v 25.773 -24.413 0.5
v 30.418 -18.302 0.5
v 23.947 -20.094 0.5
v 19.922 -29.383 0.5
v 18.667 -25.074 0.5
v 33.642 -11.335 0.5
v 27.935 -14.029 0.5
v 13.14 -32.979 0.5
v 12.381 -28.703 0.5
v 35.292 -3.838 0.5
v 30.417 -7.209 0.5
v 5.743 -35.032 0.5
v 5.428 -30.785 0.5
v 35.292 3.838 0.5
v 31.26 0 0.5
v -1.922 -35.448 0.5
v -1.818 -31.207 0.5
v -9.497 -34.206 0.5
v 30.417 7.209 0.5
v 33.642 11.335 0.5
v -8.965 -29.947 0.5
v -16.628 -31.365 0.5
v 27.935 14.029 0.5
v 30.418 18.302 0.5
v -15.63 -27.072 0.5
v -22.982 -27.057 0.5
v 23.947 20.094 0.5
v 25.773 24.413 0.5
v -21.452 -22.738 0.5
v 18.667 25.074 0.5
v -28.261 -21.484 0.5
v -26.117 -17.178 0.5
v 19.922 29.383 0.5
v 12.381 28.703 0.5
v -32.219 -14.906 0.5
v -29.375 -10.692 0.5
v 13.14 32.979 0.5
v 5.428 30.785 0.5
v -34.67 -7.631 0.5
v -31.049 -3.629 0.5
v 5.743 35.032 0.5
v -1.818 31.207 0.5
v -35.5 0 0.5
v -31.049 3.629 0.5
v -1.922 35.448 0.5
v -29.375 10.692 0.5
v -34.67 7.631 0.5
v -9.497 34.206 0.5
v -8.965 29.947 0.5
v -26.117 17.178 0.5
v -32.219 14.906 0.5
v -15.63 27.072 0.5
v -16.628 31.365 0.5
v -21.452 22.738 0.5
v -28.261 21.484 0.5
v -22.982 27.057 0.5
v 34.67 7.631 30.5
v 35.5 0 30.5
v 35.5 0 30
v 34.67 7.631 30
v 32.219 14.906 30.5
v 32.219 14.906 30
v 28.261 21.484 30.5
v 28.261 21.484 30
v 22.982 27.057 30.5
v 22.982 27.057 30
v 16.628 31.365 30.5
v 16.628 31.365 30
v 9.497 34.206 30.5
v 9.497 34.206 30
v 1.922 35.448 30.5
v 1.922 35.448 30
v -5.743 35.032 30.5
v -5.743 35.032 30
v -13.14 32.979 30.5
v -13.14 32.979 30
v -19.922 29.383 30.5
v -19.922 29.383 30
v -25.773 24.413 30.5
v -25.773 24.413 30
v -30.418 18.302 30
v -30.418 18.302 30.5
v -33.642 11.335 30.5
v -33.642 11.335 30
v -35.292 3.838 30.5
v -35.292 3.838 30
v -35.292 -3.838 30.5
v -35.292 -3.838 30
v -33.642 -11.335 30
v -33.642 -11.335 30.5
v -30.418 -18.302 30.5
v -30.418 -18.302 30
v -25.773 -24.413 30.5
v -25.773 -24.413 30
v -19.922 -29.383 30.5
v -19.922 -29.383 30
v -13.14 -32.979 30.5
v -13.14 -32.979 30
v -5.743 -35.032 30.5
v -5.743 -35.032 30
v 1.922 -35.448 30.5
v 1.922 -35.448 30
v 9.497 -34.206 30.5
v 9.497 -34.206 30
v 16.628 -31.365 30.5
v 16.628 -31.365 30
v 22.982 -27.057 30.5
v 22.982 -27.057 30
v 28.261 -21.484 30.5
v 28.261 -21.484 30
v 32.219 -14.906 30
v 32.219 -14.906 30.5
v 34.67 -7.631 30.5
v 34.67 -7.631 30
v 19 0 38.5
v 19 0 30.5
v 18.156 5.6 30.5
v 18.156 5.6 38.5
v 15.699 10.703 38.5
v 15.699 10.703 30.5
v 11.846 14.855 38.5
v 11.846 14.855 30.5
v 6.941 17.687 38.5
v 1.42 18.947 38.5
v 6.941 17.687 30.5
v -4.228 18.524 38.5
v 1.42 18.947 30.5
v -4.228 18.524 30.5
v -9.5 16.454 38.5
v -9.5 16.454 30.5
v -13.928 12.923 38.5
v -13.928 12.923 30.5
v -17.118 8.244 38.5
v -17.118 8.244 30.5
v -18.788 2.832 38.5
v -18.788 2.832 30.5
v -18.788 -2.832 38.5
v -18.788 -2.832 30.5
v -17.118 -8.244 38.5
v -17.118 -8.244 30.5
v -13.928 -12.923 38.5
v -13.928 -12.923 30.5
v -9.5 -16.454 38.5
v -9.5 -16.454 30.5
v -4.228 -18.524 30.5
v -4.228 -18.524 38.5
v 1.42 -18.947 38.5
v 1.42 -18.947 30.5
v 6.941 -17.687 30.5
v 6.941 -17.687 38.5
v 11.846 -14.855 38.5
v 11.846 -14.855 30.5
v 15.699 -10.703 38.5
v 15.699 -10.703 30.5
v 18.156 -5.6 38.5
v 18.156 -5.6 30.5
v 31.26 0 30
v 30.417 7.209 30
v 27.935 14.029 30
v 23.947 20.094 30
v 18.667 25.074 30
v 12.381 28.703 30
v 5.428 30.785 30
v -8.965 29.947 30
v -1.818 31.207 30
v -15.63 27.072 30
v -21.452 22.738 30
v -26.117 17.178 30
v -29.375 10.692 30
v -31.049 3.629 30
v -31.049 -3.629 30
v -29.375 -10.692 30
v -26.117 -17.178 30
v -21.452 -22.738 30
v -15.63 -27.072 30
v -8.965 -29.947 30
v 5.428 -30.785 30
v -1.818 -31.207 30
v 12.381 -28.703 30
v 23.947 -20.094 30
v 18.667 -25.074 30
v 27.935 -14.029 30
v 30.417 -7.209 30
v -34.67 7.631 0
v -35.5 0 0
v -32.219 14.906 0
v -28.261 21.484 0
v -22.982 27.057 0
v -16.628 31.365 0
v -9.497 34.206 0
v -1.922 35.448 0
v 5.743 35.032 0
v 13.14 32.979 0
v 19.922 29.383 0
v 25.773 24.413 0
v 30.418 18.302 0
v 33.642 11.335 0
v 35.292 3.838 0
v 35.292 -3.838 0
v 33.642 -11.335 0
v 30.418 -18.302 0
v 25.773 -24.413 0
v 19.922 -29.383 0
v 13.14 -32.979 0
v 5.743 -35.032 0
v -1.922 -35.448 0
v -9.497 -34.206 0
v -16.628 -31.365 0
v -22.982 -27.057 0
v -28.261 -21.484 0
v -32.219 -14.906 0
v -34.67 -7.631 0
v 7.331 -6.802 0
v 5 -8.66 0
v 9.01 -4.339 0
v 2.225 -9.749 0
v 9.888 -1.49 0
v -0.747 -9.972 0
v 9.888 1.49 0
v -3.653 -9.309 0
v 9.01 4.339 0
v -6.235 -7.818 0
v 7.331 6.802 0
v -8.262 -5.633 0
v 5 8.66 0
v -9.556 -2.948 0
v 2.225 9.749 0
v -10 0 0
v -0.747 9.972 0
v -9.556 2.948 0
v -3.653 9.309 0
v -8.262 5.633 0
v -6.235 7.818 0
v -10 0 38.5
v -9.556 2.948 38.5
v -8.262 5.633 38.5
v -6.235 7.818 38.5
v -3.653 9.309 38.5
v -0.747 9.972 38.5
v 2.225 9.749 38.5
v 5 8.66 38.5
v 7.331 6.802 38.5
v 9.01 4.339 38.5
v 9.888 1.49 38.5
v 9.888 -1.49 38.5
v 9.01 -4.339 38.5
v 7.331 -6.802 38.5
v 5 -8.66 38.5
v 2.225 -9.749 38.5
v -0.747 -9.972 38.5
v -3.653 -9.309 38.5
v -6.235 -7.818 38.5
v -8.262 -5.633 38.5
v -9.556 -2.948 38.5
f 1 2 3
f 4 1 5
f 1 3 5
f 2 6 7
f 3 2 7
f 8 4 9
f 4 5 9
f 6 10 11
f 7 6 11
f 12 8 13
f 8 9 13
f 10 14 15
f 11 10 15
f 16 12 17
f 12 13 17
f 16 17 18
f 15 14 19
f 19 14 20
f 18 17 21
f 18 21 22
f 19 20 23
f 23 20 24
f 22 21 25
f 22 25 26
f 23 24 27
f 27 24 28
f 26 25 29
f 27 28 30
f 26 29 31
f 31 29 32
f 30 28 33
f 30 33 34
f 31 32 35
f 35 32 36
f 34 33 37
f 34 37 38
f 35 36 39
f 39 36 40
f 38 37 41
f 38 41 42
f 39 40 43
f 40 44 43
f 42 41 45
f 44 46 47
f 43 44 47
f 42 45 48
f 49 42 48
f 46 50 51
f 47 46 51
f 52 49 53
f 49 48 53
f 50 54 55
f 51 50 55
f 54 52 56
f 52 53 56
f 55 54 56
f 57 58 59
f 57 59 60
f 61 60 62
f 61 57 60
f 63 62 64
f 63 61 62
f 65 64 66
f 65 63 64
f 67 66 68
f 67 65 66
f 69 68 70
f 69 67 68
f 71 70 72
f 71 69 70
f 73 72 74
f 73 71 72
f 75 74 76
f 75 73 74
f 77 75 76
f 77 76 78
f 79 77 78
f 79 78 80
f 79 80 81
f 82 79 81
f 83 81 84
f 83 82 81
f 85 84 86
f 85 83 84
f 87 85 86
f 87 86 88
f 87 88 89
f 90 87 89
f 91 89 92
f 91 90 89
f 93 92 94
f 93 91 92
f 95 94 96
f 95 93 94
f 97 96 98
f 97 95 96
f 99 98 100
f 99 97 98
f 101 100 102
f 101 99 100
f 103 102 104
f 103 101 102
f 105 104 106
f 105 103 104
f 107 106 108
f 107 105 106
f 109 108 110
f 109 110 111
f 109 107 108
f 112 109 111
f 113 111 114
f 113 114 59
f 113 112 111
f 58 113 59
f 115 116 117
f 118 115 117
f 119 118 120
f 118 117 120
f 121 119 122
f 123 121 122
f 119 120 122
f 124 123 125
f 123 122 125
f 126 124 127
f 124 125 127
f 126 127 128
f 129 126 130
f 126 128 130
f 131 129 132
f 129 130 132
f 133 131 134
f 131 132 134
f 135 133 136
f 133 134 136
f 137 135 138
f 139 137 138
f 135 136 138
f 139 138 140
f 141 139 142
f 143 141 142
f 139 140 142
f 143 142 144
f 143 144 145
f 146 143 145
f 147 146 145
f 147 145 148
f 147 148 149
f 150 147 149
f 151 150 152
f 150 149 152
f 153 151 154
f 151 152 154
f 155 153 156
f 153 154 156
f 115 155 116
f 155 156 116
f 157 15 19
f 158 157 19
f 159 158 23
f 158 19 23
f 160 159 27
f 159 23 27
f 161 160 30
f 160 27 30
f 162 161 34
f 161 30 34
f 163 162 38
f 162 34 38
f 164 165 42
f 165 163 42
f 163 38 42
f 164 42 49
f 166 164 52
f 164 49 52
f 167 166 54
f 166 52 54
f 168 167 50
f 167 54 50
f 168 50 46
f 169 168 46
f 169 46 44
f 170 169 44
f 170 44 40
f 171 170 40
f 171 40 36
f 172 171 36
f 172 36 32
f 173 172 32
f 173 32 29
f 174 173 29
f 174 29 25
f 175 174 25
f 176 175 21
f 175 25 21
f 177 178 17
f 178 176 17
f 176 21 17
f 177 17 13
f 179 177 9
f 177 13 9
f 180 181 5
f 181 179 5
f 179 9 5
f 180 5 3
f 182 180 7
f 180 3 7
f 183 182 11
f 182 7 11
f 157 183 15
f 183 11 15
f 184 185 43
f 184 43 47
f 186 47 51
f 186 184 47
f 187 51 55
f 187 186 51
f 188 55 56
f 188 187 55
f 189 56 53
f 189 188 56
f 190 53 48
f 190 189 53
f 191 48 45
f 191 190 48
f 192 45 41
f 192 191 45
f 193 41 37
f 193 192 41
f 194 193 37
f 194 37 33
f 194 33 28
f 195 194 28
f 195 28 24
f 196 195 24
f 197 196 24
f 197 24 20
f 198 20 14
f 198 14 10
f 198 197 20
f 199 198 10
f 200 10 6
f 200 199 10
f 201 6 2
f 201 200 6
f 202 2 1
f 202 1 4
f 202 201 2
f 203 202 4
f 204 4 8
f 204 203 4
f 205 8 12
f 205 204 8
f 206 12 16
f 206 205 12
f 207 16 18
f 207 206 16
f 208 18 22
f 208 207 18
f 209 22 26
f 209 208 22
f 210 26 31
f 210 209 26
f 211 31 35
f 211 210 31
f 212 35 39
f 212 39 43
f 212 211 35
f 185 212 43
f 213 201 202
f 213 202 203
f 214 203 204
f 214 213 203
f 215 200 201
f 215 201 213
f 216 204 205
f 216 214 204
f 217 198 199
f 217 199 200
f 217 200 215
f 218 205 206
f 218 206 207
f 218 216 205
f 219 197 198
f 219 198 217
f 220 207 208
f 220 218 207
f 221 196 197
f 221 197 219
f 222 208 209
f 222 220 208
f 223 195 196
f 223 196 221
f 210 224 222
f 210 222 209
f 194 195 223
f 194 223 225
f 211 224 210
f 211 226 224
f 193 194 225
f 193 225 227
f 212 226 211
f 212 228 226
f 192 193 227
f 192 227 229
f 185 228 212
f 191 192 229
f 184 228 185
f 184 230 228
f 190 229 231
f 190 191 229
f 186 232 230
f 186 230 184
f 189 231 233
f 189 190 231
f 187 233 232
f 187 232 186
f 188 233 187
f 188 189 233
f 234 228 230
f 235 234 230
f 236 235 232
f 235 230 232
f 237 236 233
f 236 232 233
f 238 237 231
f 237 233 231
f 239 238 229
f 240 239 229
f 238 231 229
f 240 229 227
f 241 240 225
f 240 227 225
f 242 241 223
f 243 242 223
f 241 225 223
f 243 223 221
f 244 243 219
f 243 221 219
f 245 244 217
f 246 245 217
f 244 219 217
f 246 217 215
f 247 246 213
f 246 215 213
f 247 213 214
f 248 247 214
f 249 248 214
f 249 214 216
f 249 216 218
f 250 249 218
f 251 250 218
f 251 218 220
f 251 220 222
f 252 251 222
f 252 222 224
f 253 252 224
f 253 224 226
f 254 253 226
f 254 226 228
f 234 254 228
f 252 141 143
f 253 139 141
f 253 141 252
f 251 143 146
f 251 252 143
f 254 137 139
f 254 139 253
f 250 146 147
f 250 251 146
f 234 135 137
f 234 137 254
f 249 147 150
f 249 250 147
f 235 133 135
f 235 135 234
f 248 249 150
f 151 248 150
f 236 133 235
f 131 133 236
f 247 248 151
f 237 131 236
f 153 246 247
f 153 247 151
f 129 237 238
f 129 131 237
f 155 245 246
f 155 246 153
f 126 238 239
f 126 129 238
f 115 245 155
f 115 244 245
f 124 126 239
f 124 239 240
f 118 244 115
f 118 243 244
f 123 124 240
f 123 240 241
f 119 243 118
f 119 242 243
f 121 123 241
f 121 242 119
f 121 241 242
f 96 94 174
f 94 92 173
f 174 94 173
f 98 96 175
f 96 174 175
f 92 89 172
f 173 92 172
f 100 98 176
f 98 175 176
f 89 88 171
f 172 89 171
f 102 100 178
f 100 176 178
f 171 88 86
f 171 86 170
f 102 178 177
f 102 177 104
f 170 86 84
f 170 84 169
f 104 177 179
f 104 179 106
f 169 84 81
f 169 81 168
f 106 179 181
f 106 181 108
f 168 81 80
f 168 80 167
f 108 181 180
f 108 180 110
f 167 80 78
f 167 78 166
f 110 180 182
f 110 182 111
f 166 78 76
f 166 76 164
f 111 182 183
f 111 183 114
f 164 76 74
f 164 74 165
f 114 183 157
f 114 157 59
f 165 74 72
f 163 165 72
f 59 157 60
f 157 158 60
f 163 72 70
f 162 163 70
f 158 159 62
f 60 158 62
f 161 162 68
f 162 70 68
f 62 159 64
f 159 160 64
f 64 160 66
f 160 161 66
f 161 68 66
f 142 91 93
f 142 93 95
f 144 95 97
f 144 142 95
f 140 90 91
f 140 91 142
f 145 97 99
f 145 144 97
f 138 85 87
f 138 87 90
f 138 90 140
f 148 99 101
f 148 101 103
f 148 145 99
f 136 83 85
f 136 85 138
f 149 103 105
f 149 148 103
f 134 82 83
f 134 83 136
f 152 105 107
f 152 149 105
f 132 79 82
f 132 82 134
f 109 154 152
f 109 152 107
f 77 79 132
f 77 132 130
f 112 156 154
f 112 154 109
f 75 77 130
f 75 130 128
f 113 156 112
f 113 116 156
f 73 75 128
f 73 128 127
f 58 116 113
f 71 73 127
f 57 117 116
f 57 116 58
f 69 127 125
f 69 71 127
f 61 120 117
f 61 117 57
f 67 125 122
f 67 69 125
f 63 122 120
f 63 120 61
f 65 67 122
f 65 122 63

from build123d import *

# Parameters (mm, degrees)
SZKIC1_R                    = 31.26
DODANIE_WYCI_GNI_CIE1_DEPTH = 30.5
SZKIC2_R                    = 19
DODANIE_WYCI_GNI_CIE2_DEPTH = 8
SZKIC3_R                    = 35.5
DODANIE_WYCI_GNI_CIE3_DEPTH = 0.5
SZKIC7_R                    = 35.5
DODANIE_WYCI_GNI_CIE4_DEPTH = 0.5
SZKIC8_R                    = 10
WYTNIJ_WYCI_GNI_CIE4_DEPTH  = 39.5


with BuildPart() as part:
    # Szkic1 → Dodanie-wyciągnięcie1 (new body)
    with BuildSketch(Plane.XY):
        Circle(SZKIC1_R)
    extrude(amount=DODANIE_WYCI_GNI_CIE1_DEPTH)

    # Szkic2 → Dodanie-wyciągnięcie2 (add)
    with BuildSketch(Plane.XY.offset(30.5)):
        Circle(SZKIC2_R)
    extrude(amount=DODANIE_WYCI_GNI_CIE2_DEPTH)

    # Szkic3 → Dodanie-wyciągnięcie3 (add)
    with BuildSketch(Plane.XY.offset(30.5)):
        Circle(SZKIC3_R)
    extrude(amount=-DODANIE_WYCI_GNI_CIE3_DEPTH)

    # Szkic7 → Dodanie-wyciągnięcie4 (add)
    with BuildSketch(Plane(origin=(0, 0, 0), x_dir=(-1, 0, 0), z_dir=(0, 0, -1))):
        Circle(SZKIC7_R)
    extrude(amount=-DODANIE_WYCI_GNI_CIE4_DEPTH)

    # Szkic8 → Wytnij-wyciągnięcie4 (cut, through all)
    with BuildSketch(Plane(origin=(0, 0, 0), x_dir=(-1, 0, 0), z_dir=(0, 0, -1))):
        Circle(SZKIC8_R)
    extrude(amount=-WYTNIJ_WYCI_GNI_CIE4_DEPTH, mode=Mode.SUBTRACT)


solid = part.part
